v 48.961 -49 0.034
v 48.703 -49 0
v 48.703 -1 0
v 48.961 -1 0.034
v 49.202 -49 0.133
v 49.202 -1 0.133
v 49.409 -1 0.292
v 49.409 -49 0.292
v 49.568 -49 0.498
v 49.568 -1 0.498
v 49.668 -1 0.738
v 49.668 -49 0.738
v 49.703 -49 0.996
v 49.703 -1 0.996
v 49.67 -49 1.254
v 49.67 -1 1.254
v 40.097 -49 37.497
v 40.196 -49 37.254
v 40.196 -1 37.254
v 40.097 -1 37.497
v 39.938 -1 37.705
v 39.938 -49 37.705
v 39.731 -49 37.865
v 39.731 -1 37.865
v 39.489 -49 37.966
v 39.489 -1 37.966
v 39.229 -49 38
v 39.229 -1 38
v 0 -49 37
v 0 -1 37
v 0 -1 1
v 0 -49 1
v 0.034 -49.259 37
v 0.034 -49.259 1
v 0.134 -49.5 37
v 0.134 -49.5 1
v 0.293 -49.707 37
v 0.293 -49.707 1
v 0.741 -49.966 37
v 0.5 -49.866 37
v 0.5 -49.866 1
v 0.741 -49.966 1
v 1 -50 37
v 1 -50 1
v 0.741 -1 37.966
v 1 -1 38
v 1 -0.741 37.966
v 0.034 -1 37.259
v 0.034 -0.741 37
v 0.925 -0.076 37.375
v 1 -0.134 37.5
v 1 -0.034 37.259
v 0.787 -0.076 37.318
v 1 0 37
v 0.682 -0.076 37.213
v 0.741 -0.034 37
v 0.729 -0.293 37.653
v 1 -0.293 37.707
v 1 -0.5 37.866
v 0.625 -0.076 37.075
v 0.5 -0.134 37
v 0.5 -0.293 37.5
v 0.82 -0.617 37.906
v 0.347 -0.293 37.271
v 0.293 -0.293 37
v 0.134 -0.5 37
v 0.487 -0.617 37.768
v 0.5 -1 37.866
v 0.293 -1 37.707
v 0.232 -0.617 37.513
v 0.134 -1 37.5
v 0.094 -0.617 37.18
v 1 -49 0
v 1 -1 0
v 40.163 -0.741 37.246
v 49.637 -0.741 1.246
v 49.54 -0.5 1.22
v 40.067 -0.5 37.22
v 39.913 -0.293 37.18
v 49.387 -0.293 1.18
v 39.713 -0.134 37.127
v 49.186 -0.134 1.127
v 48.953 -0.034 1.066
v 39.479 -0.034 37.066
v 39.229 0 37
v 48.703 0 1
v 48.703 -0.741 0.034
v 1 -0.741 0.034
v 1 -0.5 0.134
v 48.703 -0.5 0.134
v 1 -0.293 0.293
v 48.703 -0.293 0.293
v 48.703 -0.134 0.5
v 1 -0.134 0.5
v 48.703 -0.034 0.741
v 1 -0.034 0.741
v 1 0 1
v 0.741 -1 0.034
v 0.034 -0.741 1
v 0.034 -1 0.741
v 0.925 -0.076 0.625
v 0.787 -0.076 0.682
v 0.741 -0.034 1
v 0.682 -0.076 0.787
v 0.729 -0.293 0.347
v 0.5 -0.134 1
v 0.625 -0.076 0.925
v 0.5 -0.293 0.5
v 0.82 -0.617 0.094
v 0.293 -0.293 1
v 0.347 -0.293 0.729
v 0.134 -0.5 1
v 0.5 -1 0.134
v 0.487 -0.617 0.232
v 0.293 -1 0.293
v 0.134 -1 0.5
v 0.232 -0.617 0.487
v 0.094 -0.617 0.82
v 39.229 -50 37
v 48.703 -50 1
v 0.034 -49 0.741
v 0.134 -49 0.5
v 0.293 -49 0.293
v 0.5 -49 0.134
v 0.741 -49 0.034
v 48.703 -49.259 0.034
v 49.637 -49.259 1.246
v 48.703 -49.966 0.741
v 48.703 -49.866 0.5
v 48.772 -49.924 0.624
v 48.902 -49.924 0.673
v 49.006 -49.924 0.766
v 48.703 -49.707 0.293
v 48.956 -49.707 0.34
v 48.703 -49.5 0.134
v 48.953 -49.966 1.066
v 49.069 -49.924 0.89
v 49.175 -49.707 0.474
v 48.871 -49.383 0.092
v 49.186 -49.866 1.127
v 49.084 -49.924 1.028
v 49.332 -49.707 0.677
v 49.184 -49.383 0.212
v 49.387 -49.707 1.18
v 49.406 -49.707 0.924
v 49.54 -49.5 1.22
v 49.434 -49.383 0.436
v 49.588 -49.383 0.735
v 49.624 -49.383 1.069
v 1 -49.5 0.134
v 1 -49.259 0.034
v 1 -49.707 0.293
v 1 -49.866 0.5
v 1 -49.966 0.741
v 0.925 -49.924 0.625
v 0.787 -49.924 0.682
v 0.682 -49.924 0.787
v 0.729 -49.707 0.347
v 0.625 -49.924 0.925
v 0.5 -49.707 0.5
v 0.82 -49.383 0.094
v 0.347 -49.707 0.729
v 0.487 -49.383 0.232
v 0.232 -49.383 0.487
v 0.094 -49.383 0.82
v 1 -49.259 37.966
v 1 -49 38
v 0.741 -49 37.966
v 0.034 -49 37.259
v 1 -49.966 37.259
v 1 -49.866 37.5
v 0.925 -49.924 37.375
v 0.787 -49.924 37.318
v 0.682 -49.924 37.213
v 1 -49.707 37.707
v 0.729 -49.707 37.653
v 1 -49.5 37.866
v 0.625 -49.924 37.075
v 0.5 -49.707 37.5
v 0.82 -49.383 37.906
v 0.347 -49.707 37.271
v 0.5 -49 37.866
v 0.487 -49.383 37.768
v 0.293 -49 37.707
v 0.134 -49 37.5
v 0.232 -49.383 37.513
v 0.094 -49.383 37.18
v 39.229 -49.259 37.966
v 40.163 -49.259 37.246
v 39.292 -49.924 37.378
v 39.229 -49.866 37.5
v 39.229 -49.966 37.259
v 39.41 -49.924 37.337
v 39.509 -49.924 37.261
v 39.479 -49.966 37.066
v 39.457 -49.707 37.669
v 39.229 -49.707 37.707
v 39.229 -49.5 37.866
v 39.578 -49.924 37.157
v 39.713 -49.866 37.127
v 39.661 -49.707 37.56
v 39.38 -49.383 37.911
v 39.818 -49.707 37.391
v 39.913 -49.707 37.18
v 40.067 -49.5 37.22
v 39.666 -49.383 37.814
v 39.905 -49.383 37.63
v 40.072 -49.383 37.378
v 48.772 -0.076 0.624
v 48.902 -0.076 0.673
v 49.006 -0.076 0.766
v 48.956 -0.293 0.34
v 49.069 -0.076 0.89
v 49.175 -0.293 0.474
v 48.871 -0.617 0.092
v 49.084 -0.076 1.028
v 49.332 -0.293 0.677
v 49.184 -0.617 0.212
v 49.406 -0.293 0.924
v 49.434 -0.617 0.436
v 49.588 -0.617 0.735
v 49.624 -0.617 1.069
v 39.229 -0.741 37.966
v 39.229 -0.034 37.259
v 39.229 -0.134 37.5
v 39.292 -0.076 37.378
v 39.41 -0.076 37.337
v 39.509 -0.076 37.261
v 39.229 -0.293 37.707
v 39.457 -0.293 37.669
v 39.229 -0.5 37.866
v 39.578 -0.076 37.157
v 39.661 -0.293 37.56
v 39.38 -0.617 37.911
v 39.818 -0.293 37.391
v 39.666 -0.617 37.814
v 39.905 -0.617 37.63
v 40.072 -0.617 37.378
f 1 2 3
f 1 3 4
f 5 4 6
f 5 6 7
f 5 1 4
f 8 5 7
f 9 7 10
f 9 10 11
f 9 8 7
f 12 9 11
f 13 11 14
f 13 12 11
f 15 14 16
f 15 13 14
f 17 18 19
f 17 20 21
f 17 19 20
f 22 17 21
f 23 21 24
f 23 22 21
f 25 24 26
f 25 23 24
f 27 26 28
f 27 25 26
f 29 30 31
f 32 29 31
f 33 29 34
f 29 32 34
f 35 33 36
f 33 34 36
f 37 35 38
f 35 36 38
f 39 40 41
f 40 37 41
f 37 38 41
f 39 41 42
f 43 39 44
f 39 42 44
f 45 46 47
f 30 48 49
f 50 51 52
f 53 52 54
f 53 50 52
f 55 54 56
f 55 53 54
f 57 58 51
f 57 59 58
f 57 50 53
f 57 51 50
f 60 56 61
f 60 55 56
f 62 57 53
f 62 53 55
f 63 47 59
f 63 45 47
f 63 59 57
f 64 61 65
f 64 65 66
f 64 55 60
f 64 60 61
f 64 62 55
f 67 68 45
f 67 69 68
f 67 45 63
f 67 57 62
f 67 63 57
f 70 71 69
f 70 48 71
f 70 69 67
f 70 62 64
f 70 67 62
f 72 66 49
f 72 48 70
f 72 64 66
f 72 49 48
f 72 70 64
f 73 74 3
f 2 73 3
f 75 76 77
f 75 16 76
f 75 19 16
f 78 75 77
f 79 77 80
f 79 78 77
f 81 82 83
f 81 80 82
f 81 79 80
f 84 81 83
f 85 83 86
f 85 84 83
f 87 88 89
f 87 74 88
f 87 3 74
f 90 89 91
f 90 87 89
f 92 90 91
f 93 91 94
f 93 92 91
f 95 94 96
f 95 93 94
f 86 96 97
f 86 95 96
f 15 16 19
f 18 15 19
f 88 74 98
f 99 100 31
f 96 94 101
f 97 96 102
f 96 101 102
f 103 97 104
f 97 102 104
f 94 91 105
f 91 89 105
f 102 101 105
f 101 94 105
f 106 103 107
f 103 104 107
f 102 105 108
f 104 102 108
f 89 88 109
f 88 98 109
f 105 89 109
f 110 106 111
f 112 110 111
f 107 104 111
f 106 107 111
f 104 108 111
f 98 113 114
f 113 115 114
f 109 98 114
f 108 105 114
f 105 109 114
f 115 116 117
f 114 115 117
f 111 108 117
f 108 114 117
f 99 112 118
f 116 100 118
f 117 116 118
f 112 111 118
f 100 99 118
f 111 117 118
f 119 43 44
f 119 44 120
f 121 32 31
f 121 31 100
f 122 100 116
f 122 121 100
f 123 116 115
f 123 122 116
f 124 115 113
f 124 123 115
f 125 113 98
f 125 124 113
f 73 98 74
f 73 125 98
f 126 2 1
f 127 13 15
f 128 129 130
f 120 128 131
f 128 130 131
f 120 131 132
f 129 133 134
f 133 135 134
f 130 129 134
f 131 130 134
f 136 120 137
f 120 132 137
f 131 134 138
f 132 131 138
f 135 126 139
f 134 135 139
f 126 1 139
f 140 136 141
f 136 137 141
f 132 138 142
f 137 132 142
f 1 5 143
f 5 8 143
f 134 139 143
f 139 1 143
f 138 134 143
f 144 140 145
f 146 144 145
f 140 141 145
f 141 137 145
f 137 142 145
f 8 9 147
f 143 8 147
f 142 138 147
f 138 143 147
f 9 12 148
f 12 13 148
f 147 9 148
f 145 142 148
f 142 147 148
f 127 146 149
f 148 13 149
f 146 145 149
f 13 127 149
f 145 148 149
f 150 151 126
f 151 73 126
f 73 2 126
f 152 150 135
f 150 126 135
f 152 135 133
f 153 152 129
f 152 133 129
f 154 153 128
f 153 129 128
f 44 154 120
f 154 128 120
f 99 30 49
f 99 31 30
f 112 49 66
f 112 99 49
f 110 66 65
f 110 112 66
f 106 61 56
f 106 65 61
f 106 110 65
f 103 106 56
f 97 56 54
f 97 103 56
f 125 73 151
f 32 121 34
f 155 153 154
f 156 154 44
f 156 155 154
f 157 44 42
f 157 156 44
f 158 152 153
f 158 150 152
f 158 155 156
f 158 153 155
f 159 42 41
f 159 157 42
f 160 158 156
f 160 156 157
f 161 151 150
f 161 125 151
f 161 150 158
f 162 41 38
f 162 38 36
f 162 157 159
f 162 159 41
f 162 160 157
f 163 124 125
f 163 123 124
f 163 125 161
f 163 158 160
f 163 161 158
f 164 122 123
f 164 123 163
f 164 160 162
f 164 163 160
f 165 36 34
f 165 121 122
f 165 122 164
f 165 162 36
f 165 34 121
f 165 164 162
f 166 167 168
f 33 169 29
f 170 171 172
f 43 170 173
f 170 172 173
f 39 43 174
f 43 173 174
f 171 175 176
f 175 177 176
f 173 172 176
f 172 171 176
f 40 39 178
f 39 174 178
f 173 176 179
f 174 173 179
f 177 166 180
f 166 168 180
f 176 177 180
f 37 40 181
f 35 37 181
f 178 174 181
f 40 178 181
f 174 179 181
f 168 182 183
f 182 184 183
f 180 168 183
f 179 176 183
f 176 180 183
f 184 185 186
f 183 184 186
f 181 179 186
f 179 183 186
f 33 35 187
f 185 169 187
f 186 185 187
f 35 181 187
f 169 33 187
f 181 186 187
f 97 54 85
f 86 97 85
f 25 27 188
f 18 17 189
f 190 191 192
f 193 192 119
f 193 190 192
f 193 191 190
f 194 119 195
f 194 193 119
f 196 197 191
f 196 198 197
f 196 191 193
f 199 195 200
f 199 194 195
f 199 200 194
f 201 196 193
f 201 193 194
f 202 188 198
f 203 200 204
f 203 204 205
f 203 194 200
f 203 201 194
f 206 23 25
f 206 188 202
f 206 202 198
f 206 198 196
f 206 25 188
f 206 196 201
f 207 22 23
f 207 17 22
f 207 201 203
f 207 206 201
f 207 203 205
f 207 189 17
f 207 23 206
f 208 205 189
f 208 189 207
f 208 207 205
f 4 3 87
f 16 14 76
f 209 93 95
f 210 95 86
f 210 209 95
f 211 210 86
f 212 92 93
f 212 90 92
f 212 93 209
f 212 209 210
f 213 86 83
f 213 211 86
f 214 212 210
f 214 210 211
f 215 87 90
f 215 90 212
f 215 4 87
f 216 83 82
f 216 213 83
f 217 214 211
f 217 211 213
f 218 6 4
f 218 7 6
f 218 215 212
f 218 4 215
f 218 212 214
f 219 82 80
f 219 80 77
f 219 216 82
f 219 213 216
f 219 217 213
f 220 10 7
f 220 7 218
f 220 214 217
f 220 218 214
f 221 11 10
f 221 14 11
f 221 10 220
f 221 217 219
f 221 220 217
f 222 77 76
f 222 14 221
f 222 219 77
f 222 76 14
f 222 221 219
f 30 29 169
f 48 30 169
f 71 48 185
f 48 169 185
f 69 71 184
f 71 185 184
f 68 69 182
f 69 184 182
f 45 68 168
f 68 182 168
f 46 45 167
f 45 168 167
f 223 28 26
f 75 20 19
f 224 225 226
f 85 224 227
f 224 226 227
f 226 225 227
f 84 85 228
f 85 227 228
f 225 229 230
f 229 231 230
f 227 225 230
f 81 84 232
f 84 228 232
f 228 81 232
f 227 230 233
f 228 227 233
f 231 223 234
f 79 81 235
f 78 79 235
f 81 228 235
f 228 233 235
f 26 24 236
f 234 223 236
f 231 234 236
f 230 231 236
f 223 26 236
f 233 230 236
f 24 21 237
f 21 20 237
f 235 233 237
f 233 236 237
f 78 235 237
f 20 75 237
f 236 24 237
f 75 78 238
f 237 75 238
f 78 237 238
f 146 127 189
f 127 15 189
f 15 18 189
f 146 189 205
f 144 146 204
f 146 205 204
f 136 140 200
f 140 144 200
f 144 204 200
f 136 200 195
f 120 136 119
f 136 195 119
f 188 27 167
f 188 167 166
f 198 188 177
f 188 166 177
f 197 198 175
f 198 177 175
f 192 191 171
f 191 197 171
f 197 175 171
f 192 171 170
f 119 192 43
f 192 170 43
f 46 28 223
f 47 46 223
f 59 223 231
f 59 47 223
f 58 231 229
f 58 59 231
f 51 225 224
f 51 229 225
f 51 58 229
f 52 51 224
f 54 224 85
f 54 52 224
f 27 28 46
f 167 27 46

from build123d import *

# Parameters (mm, degrees)
F1_DEPTH = 50
F2_R     = 1


with BuildPart() as f1:
    # F0 (on Front) → F1 (new body)
    with BuildSketch(Plane.XZ):
        Polygon((0, 38), (0, 0), (50, 0), (40, 38), align=None)
    extrude(amount=F1_DEPTH)

    # F2
    f2_edges = [f1.edges().sort_by_distance(p)[0] for p in [
        (40, -25, 38),
        (0, -25, 38),
        (20, 0, 38),
        (20, -50, 38),
        (0, -25, 0),
        (50, -25, 0),
        (25, 0, 0),
        (25, -50, 0),
        (0, -50, 19),
        (45, -50, 19),
        (45, 0, 19),
        (0, 0, 19),
    ]]
    fillet(f2_edges, radius=F2_R)


solid = f1.part
